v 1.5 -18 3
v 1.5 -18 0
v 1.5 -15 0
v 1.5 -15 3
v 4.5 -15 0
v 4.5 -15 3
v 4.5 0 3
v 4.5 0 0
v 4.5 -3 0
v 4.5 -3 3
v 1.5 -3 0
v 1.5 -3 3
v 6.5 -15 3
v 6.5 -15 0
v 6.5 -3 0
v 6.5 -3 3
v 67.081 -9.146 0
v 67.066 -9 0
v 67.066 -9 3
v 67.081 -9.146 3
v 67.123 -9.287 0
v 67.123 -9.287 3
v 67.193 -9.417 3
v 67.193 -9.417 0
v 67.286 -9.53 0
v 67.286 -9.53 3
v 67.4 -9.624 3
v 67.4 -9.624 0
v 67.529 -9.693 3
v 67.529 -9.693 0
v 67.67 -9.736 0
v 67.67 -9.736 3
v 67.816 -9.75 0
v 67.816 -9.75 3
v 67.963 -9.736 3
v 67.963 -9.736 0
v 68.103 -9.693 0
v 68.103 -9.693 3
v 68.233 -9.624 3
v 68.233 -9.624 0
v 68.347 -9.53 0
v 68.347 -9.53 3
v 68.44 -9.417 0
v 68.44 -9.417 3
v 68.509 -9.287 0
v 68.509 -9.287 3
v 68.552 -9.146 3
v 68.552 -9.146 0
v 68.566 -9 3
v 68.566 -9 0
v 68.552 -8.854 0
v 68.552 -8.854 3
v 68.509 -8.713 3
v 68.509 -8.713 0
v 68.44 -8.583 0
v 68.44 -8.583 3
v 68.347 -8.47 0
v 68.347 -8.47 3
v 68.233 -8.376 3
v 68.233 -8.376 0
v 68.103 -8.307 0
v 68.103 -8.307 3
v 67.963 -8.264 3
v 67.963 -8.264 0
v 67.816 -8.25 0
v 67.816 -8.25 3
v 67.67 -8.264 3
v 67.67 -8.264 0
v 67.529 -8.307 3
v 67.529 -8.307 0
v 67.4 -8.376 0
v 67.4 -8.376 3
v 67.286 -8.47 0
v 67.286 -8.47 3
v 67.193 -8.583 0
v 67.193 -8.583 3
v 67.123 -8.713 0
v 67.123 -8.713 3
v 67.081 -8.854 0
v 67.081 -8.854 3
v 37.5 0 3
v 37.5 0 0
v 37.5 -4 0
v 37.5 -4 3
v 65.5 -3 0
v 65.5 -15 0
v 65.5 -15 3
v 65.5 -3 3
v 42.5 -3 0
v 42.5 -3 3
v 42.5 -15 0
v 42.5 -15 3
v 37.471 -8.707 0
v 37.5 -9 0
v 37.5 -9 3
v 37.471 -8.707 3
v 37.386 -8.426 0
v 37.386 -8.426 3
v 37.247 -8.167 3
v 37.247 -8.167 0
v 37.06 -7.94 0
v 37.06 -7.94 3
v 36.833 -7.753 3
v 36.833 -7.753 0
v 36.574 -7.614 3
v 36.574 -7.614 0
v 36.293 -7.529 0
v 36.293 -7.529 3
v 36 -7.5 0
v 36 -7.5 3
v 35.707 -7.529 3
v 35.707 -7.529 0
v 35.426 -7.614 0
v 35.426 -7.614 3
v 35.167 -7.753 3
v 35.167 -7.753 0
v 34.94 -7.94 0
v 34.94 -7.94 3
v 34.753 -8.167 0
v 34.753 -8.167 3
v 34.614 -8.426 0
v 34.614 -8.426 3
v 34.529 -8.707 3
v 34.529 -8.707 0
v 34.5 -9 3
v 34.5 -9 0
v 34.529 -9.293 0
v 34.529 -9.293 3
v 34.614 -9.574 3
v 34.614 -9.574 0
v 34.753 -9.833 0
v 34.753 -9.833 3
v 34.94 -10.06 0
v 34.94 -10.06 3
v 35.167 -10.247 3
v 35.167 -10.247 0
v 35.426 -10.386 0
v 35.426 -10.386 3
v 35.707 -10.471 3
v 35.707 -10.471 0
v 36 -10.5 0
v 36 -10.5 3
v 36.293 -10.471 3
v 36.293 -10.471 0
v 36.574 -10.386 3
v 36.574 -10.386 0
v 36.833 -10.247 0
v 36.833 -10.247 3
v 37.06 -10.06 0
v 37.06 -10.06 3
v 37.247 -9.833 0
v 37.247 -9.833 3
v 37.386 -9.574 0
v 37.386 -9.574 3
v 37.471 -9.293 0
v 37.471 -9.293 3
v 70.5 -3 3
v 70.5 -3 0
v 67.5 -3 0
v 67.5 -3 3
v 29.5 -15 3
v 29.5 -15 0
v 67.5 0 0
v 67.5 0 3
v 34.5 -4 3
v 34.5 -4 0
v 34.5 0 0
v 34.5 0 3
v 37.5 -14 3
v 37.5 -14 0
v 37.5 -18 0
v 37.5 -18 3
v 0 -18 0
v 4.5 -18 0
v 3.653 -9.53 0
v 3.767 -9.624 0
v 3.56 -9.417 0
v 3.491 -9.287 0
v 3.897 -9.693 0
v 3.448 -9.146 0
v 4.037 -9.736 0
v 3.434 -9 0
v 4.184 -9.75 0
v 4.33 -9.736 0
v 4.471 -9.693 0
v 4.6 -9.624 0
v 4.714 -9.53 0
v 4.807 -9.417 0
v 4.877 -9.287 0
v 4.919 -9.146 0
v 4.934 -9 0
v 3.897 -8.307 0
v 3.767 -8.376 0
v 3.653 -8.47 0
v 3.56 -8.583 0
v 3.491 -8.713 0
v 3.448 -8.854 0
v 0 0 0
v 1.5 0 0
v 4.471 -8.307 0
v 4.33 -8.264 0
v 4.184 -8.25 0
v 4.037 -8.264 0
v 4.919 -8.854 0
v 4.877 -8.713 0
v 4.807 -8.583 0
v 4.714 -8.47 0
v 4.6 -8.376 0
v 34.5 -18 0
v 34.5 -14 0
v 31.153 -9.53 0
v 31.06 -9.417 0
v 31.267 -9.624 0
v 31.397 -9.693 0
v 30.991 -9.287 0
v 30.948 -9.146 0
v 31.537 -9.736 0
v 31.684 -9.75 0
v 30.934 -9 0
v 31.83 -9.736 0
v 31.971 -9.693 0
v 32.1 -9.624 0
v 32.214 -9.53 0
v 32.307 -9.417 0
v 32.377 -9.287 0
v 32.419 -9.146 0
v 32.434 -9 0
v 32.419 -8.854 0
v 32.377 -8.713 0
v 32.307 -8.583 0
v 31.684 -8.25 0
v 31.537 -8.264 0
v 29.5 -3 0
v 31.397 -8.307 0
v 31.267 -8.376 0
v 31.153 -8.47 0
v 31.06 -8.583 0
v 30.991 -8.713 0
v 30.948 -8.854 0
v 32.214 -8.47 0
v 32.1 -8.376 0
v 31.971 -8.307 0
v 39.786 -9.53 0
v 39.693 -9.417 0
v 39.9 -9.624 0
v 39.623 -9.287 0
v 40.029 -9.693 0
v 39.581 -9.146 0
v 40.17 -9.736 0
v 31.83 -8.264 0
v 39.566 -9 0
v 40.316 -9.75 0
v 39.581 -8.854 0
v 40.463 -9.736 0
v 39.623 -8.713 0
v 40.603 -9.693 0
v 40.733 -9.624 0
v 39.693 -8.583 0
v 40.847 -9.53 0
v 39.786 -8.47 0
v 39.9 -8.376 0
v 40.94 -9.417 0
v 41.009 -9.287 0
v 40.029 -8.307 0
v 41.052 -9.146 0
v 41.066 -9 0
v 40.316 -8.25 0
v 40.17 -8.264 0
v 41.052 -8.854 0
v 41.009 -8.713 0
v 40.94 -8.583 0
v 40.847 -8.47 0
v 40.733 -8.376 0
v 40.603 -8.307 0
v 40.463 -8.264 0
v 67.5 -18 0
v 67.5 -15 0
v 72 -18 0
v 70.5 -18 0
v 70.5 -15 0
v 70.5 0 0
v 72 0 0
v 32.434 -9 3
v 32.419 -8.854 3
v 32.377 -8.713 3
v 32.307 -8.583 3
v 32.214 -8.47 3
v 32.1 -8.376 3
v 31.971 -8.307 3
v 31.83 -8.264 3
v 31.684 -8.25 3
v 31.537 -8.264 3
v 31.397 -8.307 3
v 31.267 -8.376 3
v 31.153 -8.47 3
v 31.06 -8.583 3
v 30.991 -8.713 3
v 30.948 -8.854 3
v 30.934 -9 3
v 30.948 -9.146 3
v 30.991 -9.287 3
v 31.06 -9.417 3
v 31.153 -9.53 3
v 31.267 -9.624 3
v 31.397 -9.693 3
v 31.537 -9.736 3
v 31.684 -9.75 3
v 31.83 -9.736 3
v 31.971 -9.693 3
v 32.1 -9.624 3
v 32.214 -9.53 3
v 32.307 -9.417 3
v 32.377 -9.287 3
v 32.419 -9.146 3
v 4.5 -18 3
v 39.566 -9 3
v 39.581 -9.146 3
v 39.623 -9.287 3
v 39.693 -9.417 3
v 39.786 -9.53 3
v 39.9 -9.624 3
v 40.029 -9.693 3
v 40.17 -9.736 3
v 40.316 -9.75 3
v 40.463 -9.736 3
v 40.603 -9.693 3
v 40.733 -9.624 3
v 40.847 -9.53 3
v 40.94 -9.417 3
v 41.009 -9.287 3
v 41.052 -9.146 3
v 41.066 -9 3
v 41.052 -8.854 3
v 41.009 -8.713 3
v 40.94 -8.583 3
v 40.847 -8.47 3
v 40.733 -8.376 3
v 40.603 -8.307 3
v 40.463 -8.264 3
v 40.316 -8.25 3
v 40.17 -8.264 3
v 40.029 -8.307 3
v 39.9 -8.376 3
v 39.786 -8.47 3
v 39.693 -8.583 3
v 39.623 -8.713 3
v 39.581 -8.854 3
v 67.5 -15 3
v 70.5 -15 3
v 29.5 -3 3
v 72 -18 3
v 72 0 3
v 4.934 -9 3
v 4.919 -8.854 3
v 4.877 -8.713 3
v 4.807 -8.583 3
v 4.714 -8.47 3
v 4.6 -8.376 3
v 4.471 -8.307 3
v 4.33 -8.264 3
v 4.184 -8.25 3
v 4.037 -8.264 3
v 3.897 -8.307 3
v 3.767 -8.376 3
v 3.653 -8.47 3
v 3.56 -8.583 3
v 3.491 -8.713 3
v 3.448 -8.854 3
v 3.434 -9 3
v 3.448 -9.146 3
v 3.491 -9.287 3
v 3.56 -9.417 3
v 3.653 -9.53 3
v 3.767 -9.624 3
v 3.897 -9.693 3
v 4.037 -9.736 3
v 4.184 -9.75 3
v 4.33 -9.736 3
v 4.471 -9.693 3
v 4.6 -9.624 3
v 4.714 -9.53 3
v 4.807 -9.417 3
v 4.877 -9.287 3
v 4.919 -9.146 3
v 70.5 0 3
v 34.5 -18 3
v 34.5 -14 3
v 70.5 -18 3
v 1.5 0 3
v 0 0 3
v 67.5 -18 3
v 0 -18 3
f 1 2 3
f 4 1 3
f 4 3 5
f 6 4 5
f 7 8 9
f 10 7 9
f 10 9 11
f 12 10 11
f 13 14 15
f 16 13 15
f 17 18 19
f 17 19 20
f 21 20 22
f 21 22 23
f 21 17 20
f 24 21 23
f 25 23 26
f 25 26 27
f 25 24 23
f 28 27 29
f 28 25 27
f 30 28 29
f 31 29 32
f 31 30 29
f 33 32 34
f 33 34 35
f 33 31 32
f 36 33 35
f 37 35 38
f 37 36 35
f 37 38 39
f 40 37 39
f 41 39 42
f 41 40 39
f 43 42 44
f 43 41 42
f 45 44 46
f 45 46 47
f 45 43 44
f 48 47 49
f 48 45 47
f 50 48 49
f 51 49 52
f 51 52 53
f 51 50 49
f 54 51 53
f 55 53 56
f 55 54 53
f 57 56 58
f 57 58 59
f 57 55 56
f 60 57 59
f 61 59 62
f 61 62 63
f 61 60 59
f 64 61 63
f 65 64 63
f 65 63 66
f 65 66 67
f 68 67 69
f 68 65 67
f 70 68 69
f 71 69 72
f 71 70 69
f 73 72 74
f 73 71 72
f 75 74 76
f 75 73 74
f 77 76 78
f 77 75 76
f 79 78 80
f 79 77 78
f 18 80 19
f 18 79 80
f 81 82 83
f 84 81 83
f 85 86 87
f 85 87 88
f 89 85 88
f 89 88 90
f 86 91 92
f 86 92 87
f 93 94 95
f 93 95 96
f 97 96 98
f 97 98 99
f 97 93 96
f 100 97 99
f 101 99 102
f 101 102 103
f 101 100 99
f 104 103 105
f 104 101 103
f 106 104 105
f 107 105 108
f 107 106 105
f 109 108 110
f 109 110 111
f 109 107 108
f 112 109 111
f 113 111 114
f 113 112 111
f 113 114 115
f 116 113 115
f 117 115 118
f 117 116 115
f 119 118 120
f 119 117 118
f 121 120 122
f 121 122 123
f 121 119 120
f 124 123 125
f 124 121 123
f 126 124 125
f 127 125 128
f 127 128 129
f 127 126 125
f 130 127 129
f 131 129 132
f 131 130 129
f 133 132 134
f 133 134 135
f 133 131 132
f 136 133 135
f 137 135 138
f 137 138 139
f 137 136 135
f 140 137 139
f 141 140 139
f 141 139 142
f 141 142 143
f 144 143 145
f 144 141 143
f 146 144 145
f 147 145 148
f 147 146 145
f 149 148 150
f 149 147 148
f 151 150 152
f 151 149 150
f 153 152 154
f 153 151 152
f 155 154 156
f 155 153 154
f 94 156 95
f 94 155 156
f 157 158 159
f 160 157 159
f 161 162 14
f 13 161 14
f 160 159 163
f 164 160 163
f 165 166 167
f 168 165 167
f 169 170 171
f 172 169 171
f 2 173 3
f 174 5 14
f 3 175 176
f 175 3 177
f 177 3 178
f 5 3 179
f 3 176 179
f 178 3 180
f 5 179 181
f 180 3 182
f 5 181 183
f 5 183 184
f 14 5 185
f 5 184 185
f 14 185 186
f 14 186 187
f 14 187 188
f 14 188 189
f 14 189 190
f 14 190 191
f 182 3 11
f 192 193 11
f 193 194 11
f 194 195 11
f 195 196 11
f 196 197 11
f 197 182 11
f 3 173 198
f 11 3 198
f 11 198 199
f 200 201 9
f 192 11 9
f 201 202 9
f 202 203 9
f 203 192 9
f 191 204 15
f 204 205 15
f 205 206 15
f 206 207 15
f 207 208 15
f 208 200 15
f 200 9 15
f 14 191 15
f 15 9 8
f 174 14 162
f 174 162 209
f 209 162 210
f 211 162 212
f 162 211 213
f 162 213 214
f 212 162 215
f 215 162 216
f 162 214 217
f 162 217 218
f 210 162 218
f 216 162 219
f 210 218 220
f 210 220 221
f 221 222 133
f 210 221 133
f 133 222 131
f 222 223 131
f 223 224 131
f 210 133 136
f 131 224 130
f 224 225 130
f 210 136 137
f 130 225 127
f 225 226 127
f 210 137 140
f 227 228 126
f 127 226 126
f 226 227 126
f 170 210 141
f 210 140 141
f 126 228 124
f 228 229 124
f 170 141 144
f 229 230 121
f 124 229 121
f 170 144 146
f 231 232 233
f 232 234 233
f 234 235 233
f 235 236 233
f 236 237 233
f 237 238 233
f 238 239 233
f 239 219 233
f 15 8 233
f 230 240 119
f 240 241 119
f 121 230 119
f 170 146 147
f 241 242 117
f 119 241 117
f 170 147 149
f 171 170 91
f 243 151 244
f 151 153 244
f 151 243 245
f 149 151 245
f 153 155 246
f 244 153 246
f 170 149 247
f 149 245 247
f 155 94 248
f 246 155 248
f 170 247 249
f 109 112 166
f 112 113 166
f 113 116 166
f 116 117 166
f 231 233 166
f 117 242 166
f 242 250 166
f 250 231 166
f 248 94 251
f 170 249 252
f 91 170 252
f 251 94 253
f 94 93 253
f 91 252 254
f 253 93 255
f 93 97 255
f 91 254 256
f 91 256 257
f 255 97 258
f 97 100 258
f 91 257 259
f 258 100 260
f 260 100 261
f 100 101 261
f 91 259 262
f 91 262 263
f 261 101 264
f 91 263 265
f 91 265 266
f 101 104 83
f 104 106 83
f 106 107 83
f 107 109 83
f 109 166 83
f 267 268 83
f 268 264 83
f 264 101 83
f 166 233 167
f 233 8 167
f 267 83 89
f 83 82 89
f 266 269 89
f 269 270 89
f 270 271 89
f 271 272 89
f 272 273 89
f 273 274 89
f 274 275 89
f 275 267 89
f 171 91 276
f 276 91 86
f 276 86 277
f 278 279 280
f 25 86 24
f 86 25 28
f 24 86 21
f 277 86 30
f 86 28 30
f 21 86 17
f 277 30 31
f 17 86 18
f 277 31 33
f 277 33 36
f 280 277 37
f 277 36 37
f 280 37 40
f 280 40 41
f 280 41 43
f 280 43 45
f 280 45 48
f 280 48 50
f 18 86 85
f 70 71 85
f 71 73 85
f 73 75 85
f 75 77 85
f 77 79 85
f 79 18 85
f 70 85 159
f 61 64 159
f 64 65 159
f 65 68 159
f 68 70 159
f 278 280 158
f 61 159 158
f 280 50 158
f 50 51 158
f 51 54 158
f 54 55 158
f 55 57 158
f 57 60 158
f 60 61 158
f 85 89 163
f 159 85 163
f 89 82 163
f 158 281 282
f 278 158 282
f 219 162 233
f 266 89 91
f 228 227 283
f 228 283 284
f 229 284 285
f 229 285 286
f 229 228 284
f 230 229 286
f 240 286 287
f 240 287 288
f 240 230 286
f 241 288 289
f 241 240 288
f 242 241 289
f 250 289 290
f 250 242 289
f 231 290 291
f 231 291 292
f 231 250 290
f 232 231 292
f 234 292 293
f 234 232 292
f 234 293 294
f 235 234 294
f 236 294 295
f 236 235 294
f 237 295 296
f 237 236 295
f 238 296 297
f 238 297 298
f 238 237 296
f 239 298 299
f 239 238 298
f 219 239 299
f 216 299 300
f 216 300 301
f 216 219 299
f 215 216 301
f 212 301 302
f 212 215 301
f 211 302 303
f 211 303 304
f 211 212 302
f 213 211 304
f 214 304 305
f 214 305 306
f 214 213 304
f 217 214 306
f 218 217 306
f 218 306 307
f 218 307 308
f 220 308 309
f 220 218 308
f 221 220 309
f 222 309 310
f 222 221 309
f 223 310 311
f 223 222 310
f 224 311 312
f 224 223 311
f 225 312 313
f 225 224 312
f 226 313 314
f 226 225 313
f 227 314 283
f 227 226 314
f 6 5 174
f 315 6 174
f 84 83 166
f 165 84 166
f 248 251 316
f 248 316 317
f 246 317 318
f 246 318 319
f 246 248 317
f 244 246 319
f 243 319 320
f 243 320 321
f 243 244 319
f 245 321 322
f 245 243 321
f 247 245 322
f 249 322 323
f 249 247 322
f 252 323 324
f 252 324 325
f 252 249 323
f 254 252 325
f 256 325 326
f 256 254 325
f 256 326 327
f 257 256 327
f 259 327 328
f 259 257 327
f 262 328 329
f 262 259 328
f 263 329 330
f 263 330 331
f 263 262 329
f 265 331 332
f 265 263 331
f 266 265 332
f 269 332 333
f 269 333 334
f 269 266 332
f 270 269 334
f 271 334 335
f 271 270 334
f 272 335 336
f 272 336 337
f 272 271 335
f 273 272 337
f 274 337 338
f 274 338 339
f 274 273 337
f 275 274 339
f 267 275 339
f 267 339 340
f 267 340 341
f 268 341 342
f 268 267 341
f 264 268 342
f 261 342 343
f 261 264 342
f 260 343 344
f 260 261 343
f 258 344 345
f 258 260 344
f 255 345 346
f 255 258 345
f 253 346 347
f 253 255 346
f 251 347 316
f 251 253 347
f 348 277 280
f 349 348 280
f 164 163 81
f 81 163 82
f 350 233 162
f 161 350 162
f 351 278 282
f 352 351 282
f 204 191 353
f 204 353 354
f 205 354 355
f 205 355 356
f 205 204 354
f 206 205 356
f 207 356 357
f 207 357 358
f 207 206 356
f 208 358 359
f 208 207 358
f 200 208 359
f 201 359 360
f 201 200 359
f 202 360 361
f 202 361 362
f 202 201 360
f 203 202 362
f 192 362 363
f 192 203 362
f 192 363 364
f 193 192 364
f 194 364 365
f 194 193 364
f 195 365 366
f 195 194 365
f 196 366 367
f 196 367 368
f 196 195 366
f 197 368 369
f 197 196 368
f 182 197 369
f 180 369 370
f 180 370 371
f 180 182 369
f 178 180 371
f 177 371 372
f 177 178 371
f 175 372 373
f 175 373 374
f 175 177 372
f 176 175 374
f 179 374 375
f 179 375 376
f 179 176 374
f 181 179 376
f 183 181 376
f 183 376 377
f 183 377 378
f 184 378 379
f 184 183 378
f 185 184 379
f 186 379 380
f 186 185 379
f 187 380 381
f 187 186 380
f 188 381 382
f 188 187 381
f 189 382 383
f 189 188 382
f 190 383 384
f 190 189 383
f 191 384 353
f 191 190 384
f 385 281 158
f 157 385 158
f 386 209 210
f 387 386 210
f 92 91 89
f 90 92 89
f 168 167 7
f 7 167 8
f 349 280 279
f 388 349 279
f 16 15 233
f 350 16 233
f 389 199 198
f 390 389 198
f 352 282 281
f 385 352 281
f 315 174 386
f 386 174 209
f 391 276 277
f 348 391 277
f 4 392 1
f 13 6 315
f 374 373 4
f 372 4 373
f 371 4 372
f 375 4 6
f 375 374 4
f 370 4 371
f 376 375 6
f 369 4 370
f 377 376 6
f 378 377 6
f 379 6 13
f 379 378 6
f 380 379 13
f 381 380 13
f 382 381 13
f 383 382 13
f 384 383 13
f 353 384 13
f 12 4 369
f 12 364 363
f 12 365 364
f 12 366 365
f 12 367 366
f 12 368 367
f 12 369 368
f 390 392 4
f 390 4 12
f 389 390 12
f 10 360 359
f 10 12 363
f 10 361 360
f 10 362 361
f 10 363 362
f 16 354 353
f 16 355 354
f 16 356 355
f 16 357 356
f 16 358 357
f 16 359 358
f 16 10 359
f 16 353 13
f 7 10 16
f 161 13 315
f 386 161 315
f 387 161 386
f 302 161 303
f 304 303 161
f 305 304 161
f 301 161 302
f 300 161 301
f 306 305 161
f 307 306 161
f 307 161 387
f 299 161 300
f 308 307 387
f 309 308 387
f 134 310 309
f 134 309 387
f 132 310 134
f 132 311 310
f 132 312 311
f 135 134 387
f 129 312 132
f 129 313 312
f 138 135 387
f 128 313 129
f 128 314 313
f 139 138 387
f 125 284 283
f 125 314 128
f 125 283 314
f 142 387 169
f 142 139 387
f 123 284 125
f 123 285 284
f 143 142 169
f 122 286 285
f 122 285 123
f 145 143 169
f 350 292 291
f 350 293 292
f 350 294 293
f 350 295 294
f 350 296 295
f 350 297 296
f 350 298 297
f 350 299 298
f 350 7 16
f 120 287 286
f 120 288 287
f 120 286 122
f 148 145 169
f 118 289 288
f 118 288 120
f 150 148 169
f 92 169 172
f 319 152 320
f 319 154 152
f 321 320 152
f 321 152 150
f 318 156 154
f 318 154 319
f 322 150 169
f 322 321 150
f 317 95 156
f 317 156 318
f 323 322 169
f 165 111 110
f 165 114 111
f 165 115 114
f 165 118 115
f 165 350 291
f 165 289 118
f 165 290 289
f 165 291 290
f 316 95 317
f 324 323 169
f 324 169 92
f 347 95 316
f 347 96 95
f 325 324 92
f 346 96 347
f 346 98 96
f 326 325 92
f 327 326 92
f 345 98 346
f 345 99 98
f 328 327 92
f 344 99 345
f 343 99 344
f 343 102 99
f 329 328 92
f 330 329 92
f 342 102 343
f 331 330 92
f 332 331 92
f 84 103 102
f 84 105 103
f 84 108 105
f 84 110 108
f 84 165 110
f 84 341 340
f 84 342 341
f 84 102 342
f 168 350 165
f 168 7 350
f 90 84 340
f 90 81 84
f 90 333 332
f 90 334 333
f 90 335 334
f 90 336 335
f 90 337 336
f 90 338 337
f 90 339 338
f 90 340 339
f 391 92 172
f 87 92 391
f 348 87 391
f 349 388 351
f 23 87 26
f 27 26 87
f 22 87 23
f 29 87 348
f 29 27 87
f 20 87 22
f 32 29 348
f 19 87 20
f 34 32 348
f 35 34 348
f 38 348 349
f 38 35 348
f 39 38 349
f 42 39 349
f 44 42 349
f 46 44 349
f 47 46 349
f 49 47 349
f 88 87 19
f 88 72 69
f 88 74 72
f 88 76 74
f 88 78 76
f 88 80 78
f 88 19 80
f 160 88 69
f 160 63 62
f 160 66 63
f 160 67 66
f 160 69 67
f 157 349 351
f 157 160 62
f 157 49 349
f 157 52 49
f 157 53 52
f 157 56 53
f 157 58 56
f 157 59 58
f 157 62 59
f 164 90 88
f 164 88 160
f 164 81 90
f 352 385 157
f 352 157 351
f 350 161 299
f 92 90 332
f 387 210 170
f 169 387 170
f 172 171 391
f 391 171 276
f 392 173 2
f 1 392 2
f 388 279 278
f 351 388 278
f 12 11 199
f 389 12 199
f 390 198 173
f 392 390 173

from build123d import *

# Parameters (mm, degrees)
SKETCH_1_R      = 1.499696603
SKETCH_1_R_2    = 0.75
EXTRUDE_1_DEPTH = 3


with BuildPart() as part:
    # 草图1 → 凸台-拉伸1 (new body)
    with BuildSketch(Plane.XY):
        Polygon((0, 0), (0, -18), (1.5, -18), (1.5, -15), (4.5, -15), (4.5, -18), (34.5, -18), (34.5, -14), (37.5, -14), (37.5, -18), (67.5, -18), (67.5, -15), (70.5, -15), (70.5, -18), (72, -18), (72, 0), (70.5, 0), (70.5, -3), (67.5, -3), (67.5, 0), (37.5, 0), (37.5, -4), (34.5, -4), (34.5, 0), (4.5, 0), (4.5, -3), (1.5, -3), (1.5, 0), align=None)
        with Locations((36, -9)):
            Circle(SKETCH_1_R, mode=Mode.SUBTRACT)
        with Locations((31.683762096, -9)):
            Circle(SKETCH_1_R_2, mode=Mode.SUBTRACT)
        with Locations((4.183762096, -9)):
            Circle(SKETCH_1_R_2, mode=Mode.SUBTRACT)
        with Locations(Location((67.816237904, -9, 0), (0, 0, 180))):
            Circle(SKETCH_1_R_2, mode=Mode.SUBTRACT)
        with Locations(Location((40.316237904, -9, 0), (0, 0, 180))):
            Circle(SKETCH_1_R_2, mode=Mode.SUBTRACT)
        Polygon((29.5, -9), (29.5, -15), (6.5, -15), (6.5, -3), (29.5, -3), align=None, mode=Mode.SUBTRACT)
        Polygon((42.5, -3), (42.5, -9), (42.5, -15), (65.5, -15), (65.5, -3), align=None, mode=Mode.SUBTRACT)
    extrude(amount=EXTRUDE_1_DEPTH)


solid = part.part
